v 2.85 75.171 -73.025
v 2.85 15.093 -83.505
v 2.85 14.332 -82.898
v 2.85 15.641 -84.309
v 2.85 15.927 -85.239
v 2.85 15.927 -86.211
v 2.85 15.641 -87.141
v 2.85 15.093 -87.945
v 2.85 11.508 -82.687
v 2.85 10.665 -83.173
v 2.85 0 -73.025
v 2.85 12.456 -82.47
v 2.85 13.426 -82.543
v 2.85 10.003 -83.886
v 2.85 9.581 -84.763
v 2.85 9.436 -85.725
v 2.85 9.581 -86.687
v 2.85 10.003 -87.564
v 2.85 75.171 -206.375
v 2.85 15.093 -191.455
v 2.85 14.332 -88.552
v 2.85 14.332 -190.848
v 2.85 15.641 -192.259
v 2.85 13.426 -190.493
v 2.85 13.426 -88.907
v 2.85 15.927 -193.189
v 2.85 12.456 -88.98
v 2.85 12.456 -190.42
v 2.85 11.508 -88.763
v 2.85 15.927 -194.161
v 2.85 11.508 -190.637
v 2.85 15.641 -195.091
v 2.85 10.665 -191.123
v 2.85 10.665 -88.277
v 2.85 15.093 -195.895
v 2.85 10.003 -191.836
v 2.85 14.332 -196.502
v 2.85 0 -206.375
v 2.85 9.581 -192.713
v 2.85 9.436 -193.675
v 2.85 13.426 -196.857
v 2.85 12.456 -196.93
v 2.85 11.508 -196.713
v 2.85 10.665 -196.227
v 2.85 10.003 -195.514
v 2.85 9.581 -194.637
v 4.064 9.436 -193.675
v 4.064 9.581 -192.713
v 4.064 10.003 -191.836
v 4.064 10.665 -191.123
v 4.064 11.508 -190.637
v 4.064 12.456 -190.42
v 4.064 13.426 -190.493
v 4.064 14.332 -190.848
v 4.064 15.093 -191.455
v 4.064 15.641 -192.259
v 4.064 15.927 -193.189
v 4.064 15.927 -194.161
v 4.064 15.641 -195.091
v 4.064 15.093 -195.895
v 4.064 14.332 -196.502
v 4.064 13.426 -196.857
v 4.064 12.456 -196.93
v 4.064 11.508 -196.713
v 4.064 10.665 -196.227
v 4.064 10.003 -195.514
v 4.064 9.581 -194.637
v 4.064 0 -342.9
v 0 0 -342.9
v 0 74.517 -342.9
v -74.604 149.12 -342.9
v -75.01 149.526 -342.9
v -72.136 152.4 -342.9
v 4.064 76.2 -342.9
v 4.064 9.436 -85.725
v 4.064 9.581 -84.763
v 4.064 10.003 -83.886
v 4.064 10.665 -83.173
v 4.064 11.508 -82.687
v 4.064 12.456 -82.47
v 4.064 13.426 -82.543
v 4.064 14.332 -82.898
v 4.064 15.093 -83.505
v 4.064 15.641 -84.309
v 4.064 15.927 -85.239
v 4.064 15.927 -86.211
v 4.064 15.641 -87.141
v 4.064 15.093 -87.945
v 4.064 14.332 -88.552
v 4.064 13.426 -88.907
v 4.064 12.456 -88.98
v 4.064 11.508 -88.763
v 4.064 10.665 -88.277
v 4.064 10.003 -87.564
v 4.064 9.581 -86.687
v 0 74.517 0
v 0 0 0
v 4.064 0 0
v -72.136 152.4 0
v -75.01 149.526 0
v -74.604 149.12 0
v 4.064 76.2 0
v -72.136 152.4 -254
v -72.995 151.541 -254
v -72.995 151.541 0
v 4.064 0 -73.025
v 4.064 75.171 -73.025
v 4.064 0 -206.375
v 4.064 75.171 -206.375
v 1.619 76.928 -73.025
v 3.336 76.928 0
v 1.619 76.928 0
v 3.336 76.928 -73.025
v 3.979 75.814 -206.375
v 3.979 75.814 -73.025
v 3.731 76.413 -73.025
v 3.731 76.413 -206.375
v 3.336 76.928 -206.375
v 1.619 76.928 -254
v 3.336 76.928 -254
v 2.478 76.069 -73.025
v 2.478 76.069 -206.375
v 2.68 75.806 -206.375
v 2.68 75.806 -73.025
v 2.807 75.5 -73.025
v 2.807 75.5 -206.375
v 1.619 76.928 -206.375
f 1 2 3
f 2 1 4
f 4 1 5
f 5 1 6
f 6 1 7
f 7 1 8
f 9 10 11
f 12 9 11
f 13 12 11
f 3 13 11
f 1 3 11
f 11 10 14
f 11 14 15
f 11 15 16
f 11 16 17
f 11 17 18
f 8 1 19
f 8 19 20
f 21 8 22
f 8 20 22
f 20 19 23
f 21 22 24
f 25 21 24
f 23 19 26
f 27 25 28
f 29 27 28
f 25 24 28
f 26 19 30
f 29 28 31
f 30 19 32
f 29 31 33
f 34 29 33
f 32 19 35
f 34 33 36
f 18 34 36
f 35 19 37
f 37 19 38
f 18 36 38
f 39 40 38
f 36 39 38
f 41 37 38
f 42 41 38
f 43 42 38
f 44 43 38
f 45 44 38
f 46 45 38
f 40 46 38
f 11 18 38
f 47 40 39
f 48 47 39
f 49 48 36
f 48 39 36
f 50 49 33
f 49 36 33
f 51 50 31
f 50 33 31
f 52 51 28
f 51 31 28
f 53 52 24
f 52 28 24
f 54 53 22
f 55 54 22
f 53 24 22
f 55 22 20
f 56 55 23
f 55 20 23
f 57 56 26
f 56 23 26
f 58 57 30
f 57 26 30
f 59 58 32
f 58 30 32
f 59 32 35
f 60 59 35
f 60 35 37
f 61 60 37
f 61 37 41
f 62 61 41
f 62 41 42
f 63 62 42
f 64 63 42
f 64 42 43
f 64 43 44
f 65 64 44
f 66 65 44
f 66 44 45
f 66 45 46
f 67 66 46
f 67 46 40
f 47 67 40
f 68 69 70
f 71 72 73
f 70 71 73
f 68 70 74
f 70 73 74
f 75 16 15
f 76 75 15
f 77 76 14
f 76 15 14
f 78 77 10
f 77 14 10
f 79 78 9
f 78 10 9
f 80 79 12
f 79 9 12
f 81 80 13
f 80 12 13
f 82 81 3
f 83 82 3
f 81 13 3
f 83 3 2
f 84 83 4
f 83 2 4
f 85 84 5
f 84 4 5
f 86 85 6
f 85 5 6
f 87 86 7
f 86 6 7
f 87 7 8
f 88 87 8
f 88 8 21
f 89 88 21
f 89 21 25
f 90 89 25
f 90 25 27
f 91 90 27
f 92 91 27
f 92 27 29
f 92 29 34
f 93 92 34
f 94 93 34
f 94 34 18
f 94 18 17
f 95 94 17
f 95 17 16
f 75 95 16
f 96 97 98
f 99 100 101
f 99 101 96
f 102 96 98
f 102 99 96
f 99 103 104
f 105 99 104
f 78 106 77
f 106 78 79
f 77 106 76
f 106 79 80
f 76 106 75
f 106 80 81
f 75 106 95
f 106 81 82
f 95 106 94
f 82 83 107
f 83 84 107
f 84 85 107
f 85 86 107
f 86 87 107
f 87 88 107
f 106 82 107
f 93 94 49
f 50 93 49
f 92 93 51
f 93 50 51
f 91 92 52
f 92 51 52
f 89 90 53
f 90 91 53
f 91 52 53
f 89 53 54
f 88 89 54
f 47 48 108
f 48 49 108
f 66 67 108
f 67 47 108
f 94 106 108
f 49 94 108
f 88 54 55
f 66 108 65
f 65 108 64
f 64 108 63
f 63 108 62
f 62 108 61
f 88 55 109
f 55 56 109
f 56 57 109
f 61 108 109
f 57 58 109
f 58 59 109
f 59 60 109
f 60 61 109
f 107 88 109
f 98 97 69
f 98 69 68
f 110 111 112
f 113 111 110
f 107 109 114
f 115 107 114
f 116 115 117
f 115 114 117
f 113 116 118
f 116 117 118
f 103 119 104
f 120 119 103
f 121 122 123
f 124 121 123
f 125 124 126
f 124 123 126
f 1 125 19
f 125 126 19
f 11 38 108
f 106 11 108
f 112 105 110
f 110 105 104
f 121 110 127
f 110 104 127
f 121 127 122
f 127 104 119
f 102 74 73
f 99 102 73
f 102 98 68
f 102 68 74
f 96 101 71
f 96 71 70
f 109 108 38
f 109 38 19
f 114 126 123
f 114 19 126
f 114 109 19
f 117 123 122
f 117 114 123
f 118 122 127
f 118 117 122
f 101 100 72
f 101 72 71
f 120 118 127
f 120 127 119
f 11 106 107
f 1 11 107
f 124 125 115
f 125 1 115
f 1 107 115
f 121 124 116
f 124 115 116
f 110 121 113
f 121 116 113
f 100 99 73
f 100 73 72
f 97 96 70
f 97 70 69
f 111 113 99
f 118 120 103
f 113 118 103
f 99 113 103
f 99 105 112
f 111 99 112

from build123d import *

# Parameters (mm, degrees)
BOSS_EXTRUDE2_DEPTH  = 342.9
CONVERT_SOLID2_START = -342.9
CONVERT_SOLID2_DEPTH = 342.9
SKETCH12_W           = 73.025
SKETCH12_H           = 76.927581903
CUT_EXTRUDE1_DEPTH   = 292.1
SKETCH13_W           = 85.725
SKETCH13_H           = 76.927581903
CUT_EXTRUDE2_DEPTH   = 292.1
SKETCH14_R           = 3.2639
CUT_EXTRUDE3_DEPTH   = 292.1
SKETCH18_W           = 50.8
SKETCH18_H           = 76.927581903
CUT_EXTRUDE4_DEPTH   = 439.772530417
SKETCH21_W           = 63.5
SKETCH21_H           = 100.852216804
CUT_EXTRUDE11_DEPTH  = 439.772530417
SKETCH22_W           = 25.4
SKETCH22_H           = 168.264198316
CUT_EXTRUDE13_DEPTH  = 439.772530417


# Read off the part's stored shape, not the designer's step: Convert-Solid2
with BuildPart() as part:
    # Sketch7 → Boss-Extrude2 (new body)
    with BuildSketch(Plane.XY):
        Polygon((0, 0), (4.064, 0), (4.064, 76.2), (-72.136, 152.4), (-75.009681959, 149.526318041), (-74.603697881, 149.120333963), (0, 74.516636083), align=None)
    extrude(amount=-BOSS_EXTRUDE2_DEPTH)


with BuildPart() as body_2:
    # Convert-Solid2 outline → Convert-Solid2 (new body)
    with BuildSketch(Plane.XY.offset(CONVERT_SOLID2_START)):
        with BuildLine():
            Line((2.84988, 0), (4.064, 0))
            Line((4.064, 0), (4.064, 75.171043805))
            ThreePointArc((4.064, 75.171043805), (3.874907624, 76.121675373), (3.336418097, 76.927581903))
            Line((3.336418097, 76.927581903), (-72.136, 152.4))
            Line((-72.136, 152.4), (-72.994512485, 151.541487515))
            Line((-72.994512485, 151.541487515), (2.477905612, 76.069069418))
            ThreePointArc((2.477905612, 76.069069418), (2.753207006, 75.657051765), (2.84988, 75.171043805))
            Line((2.84988, 75.171043805), (2.84988, 0))
        make_face()
    extrude(amount=CONVERT_SOLID2_DEPTH)

    # Sketch12 → Cut-Extrude1 (cut)
    with BuildSketch(Plane(origin=(152.4, 0, 0), x_dir=(0, 0, -1), z_dir=(1, 0, 0))):
        with Locations((36.5125, 38.463790952)):
            Rectangle(SKETCH12_W, SKETCH12_H)
    extrude(amount=-CUT_EXTRUDE1_DEPTH, mode=Mode.SUBTRACT)

    # Sketch13 → Cut-Extrude2 (cut)
    with BuildSketch(Plane(origin=(152.4, 0, 0), x_dir=(0, 0, -1), z_dir=(1, 0, 0))):
        with Locations((249.2375, 38.463790952)):
            Rectangle(SKETCH13_W, SKETCH13_H)
    extrude(amount=-CUT_EXTRUDE2_DEPTH, mode=Mode.SUBTRACT)

    # Sketch14 → Cut-Extrude3 (cut)
    with BuildSketch(Plane.ZY.offset(-2.84988)):
        with Locations(Location((-193.675, 12.7, 0), (0, 0, 270))):
            Circle(SKETCH14_R)
        with Locations(Location((-85.725, 12.7, 0), (0, 0, 270))):
            Circle(SKETCH14_R)
    extrude(amount=-CUT_EXTRUDE3_DEPTH, mode=Mode.SUBTRACT)

    # Sketch18 → Cut-Extrude4 (cut, through all)
    with BuildSketch(Plane(origin=(152.4, 0, 0), x_dir=(0, 0, -1), z_dir=(1, 0, 0))):
        with Locations((317.5, 38.463790952)):
            Rectangle(SKETCH18_W, SKETCH18_H)
    extrude(amount=-CUT_EXTRUDE4_DEPTH, mode=Mode.SUBTRACT)

    # Sketch21 → Cut-Extrude11 (cut, through all)
    with BuildSketch(Plane(origin=(152.4, 0, 0), x_dir=(0, 0, -1), z_dir=(1, 0, 0))):
        with Locations((311.15, 127.353690305)):
            Rectangle(SKETCH21_W, SKETCH21_H)
    extrude(amount=-CUT_EXTRUDE11_DEPTH, mode=Mode.SUBTRACT)

    # Sketch22 → Cut-Extrude13 (cut, through all)
    with BuildSketch(Plane(origin=(152.4, 0, 0), x_dir=(0, 0, -1), z_dir=(1, 0, 0))):
        with Locations((266.7, 68.267900842)):
            Rectangle(SKETCH22_W, SKETCH22_H)
    extrude(amount=-CUT_EXTRUDE13_DEPTH, mode=Mode.SUBTRACT)


solid = Compound([part.part, body_2.part])
